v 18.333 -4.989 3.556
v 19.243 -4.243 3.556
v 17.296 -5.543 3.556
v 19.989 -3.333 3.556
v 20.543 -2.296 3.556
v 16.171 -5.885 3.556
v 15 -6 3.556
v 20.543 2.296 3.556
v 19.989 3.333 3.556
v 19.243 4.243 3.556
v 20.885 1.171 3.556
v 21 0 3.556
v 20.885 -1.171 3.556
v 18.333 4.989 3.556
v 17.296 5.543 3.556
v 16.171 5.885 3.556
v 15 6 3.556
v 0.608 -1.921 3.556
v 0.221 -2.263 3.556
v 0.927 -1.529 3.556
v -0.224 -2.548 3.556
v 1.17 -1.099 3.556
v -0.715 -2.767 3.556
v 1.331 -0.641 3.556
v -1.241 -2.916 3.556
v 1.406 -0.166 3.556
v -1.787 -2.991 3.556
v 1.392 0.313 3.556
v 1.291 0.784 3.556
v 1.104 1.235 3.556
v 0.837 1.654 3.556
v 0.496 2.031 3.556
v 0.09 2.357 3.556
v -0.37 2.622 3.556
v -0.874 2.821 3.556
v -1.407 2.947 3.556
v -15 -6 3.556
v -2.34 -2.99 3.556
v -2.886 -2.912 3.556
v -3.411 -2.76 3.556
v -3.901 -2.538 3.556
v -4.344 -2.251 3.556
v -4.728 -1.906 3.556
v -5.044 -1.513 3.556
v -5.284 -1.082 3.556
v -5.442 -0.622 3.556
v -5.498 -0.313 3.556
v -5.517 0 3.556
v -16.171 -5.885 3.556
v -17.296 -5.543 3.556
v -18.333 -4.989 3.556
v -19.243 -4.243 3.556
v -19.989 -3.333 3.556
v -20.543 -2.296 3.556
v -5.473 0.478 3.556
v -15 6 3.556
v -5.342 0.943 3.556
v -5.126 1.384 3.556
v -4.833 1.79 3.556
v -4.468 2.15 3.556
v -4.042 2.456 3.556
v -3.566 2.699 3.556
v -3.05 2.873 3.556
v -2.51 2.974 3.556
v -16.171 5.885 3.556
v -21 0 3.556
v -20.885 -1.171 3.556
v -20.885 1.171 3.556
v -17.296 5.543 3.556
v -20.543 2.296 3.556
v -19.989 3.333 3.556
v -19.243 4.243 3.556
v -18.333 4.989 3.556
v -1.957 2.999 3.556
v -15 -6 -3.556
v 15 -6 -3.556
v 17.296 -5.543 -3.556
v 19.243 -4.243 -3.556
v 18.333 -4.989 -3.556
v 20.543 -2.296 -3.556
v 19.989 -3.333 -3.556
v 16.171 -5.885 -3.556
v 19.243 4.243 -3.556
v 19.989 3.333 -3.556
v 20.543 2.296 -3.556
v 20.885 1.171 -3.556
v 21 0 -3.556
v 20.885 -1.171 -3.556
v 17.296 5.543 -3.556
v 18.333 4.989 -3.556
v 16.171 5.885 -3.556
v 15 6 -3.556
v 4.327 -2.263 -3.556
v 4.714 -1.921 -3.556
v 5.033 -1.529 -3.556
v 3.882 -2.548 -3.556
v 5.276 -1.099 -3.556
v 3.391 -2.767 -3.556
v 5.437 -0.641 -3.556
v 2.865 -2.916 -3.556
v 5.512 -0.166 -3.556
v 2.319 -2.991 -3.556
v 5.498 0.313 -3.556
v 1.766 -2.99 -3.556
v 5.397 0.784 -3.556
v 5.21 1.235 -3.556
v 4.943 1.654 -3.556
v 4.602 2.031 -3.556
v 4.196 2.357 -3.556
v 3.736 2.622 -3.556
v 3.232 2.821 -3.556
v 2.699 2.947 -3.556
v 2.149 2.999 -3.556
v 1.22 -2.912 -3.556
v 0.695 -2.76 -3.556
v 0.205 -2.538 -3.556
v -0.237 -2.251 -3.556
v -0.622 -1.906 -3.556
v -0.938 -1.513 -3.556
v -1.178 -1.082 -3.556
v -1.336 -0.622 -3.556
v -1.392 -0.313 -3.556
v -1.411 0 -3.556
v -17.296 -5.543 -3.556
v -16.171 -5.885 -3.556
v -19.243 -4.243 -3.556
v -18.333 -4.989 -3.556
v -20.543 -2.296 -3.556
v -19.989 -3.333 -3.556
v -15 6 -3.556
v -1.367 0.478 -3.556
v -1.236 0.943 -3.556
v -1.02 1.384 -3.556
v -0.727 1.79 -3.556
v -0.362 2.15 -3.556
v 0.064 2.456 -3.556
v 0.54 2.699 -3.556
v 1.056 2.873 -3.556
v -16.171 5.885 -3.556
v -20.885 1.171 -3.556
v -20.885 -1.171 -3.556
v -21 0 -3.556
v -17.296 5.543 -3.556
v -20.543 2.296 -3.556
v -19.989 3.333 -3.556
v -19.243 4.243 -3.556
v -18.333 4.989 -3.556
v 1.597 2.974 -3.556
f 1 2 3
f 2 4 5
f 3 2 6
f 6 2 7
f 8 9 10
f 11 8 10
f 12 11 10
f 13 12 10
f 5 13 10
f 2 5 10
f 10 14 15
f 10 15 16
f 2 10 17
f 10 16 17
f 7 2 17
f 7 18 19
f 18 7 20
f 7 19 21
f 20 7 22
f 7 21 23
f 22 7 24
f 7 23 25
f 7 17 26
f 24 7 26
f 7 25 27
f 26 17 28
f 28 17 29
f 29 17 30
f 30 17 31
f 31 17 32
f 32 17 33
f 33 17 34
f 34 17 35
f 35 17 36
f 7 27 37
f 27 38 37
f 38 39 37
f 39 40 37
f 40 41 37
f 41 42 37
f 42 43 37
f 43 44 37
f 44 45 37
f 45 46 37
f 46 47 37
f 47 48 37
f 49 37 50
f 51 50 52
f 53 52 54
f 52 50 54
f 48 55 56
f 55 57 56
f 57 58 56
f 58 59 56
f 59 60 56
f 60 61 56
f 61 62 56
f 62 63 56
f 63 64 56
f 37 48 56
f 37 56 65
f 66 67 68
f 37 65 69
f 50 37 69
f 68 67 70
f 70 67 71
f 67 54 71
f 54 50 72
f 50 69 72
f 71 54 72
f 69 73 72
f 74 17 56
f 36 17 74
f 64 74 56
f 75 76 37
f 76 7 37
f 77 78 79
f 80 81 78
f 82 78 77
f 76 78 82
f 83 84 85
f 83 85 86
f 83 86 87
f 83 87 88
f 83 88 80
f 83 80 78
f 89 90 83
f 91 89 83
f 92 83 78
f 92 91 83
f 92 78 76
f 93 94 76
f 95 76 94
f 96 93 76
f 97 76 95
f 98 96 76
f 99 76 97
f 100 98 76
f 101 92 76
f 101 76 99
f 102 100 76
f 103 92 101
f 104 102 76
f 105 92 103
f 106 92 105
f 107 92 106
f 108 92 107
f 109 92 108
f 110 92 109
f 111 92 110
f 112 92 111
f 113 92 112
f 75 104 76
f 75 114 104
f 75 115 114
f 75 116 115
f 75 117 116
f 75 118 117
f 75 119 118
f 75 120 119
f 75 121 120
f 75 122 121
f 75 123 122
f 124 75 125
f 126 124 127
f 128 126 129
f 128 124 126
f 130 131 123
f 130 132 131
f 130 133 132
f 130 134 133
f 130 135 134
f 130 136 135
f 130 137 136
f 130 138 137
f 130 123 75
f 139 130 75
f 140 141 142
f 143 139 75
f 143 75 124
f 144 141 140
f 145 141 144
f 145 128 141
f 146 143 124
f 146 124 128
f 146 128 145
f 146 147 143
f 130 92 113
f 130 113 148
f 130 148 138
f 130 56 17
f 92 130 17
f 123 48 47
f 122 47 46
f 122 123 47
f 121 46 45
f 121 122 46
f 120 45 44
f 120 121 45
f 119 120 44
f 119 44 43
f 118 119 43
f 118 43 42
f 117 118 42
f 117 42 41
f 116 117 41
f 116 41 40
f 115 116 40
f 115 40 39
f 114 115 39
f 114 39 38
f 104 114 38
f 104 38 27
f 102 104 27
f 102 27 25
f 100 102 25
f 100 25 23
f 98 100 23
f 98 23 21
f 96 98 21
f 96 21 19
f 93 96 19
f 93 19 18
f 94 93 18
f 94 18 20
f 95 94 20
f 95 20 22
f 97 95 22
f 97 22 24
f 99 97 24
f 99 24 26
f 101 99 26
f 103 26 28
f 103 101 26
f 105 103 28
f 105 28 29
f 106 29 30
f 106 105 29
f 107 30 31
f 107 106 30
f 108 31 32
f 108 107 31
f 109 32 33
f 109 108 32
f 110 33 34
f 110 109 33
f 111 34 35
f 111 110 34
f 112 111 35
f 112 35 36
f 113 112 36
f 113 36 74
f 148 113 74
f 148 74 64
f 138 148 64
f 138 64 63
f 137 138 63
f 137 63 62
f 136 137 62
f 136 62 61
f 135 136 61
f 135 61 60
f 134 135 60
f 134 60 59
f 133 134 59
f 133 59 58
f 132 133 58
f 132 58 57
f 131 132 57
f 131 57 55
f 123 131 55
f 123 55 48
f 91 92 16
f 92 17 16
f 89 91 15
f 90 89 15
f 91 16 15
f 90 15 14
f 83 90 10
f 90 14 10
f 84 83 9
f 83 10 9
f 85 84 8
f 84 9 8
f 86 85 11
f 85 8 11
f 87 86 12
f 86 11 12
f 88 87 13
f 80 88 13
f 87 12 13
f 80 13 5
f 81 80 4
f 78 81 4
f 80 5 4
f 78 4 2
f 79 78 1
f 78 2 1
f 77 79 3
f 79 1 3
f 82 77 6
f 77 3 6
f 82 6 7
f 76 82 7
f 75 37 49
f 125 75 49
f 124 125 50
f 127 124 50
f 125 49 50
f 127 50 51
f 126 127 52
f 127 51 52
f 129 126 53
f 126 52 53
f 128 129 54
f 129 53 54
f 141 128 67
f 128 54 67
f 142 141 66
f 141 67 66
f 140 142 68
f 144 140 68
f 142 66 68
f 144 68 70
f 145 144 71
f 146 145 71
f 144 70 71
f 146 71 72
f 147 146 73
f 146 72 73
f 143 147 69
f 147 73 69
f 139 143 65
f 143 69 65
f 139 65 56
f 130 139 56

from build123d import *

# Parameters (mm, degrees)
BOSS_EXTRUDE1_DEPTH     = 3.556
CUT_EXTRUDE1_DEPTH      = 23.127926609
CUT_EXTRUDE1_DEPTH_BACK = 23.127926609
SKETCH6_R               = 3


with BuildPart() as part:
    # Sketch1 → Boss-Extrude1 (new, symmetric)
    with BuildSketch(Plane.XY):
        with BuildLine():
            Line((-15, 6), (15, 6))
            ThreePointArc((15, 6), (21, 0), (15, -6))
            Line((15, -6), (-15, -6))
            ThreePointArc((-15, -6), (-21, 0), (-15, 6))
        make_face()
    extrude(amount=BOSS_EXTRUDE1_DEPTH, both=True)

    # Sketch6 → Cut-Extrude1 (cut, two sides: drawn at the far end of the back side and taken through both)
    with BuildSketch(Plane(origin=(0, 0, 0), x_dir=(0, 1, 0), z_dir=(-0.500000000000001, 0, 0.866025403784438)).offset(-CUT_EXTRUDE1_DEPTH_BACK)):
        Circle(SKETCH6_R)
    extrude(amount=CUT_EXTRUDE1_DEPTH + CUT_EXTRUDE1_DEPTH_BACK, mode=Mode.SUBTRACT)


solid = part.part
